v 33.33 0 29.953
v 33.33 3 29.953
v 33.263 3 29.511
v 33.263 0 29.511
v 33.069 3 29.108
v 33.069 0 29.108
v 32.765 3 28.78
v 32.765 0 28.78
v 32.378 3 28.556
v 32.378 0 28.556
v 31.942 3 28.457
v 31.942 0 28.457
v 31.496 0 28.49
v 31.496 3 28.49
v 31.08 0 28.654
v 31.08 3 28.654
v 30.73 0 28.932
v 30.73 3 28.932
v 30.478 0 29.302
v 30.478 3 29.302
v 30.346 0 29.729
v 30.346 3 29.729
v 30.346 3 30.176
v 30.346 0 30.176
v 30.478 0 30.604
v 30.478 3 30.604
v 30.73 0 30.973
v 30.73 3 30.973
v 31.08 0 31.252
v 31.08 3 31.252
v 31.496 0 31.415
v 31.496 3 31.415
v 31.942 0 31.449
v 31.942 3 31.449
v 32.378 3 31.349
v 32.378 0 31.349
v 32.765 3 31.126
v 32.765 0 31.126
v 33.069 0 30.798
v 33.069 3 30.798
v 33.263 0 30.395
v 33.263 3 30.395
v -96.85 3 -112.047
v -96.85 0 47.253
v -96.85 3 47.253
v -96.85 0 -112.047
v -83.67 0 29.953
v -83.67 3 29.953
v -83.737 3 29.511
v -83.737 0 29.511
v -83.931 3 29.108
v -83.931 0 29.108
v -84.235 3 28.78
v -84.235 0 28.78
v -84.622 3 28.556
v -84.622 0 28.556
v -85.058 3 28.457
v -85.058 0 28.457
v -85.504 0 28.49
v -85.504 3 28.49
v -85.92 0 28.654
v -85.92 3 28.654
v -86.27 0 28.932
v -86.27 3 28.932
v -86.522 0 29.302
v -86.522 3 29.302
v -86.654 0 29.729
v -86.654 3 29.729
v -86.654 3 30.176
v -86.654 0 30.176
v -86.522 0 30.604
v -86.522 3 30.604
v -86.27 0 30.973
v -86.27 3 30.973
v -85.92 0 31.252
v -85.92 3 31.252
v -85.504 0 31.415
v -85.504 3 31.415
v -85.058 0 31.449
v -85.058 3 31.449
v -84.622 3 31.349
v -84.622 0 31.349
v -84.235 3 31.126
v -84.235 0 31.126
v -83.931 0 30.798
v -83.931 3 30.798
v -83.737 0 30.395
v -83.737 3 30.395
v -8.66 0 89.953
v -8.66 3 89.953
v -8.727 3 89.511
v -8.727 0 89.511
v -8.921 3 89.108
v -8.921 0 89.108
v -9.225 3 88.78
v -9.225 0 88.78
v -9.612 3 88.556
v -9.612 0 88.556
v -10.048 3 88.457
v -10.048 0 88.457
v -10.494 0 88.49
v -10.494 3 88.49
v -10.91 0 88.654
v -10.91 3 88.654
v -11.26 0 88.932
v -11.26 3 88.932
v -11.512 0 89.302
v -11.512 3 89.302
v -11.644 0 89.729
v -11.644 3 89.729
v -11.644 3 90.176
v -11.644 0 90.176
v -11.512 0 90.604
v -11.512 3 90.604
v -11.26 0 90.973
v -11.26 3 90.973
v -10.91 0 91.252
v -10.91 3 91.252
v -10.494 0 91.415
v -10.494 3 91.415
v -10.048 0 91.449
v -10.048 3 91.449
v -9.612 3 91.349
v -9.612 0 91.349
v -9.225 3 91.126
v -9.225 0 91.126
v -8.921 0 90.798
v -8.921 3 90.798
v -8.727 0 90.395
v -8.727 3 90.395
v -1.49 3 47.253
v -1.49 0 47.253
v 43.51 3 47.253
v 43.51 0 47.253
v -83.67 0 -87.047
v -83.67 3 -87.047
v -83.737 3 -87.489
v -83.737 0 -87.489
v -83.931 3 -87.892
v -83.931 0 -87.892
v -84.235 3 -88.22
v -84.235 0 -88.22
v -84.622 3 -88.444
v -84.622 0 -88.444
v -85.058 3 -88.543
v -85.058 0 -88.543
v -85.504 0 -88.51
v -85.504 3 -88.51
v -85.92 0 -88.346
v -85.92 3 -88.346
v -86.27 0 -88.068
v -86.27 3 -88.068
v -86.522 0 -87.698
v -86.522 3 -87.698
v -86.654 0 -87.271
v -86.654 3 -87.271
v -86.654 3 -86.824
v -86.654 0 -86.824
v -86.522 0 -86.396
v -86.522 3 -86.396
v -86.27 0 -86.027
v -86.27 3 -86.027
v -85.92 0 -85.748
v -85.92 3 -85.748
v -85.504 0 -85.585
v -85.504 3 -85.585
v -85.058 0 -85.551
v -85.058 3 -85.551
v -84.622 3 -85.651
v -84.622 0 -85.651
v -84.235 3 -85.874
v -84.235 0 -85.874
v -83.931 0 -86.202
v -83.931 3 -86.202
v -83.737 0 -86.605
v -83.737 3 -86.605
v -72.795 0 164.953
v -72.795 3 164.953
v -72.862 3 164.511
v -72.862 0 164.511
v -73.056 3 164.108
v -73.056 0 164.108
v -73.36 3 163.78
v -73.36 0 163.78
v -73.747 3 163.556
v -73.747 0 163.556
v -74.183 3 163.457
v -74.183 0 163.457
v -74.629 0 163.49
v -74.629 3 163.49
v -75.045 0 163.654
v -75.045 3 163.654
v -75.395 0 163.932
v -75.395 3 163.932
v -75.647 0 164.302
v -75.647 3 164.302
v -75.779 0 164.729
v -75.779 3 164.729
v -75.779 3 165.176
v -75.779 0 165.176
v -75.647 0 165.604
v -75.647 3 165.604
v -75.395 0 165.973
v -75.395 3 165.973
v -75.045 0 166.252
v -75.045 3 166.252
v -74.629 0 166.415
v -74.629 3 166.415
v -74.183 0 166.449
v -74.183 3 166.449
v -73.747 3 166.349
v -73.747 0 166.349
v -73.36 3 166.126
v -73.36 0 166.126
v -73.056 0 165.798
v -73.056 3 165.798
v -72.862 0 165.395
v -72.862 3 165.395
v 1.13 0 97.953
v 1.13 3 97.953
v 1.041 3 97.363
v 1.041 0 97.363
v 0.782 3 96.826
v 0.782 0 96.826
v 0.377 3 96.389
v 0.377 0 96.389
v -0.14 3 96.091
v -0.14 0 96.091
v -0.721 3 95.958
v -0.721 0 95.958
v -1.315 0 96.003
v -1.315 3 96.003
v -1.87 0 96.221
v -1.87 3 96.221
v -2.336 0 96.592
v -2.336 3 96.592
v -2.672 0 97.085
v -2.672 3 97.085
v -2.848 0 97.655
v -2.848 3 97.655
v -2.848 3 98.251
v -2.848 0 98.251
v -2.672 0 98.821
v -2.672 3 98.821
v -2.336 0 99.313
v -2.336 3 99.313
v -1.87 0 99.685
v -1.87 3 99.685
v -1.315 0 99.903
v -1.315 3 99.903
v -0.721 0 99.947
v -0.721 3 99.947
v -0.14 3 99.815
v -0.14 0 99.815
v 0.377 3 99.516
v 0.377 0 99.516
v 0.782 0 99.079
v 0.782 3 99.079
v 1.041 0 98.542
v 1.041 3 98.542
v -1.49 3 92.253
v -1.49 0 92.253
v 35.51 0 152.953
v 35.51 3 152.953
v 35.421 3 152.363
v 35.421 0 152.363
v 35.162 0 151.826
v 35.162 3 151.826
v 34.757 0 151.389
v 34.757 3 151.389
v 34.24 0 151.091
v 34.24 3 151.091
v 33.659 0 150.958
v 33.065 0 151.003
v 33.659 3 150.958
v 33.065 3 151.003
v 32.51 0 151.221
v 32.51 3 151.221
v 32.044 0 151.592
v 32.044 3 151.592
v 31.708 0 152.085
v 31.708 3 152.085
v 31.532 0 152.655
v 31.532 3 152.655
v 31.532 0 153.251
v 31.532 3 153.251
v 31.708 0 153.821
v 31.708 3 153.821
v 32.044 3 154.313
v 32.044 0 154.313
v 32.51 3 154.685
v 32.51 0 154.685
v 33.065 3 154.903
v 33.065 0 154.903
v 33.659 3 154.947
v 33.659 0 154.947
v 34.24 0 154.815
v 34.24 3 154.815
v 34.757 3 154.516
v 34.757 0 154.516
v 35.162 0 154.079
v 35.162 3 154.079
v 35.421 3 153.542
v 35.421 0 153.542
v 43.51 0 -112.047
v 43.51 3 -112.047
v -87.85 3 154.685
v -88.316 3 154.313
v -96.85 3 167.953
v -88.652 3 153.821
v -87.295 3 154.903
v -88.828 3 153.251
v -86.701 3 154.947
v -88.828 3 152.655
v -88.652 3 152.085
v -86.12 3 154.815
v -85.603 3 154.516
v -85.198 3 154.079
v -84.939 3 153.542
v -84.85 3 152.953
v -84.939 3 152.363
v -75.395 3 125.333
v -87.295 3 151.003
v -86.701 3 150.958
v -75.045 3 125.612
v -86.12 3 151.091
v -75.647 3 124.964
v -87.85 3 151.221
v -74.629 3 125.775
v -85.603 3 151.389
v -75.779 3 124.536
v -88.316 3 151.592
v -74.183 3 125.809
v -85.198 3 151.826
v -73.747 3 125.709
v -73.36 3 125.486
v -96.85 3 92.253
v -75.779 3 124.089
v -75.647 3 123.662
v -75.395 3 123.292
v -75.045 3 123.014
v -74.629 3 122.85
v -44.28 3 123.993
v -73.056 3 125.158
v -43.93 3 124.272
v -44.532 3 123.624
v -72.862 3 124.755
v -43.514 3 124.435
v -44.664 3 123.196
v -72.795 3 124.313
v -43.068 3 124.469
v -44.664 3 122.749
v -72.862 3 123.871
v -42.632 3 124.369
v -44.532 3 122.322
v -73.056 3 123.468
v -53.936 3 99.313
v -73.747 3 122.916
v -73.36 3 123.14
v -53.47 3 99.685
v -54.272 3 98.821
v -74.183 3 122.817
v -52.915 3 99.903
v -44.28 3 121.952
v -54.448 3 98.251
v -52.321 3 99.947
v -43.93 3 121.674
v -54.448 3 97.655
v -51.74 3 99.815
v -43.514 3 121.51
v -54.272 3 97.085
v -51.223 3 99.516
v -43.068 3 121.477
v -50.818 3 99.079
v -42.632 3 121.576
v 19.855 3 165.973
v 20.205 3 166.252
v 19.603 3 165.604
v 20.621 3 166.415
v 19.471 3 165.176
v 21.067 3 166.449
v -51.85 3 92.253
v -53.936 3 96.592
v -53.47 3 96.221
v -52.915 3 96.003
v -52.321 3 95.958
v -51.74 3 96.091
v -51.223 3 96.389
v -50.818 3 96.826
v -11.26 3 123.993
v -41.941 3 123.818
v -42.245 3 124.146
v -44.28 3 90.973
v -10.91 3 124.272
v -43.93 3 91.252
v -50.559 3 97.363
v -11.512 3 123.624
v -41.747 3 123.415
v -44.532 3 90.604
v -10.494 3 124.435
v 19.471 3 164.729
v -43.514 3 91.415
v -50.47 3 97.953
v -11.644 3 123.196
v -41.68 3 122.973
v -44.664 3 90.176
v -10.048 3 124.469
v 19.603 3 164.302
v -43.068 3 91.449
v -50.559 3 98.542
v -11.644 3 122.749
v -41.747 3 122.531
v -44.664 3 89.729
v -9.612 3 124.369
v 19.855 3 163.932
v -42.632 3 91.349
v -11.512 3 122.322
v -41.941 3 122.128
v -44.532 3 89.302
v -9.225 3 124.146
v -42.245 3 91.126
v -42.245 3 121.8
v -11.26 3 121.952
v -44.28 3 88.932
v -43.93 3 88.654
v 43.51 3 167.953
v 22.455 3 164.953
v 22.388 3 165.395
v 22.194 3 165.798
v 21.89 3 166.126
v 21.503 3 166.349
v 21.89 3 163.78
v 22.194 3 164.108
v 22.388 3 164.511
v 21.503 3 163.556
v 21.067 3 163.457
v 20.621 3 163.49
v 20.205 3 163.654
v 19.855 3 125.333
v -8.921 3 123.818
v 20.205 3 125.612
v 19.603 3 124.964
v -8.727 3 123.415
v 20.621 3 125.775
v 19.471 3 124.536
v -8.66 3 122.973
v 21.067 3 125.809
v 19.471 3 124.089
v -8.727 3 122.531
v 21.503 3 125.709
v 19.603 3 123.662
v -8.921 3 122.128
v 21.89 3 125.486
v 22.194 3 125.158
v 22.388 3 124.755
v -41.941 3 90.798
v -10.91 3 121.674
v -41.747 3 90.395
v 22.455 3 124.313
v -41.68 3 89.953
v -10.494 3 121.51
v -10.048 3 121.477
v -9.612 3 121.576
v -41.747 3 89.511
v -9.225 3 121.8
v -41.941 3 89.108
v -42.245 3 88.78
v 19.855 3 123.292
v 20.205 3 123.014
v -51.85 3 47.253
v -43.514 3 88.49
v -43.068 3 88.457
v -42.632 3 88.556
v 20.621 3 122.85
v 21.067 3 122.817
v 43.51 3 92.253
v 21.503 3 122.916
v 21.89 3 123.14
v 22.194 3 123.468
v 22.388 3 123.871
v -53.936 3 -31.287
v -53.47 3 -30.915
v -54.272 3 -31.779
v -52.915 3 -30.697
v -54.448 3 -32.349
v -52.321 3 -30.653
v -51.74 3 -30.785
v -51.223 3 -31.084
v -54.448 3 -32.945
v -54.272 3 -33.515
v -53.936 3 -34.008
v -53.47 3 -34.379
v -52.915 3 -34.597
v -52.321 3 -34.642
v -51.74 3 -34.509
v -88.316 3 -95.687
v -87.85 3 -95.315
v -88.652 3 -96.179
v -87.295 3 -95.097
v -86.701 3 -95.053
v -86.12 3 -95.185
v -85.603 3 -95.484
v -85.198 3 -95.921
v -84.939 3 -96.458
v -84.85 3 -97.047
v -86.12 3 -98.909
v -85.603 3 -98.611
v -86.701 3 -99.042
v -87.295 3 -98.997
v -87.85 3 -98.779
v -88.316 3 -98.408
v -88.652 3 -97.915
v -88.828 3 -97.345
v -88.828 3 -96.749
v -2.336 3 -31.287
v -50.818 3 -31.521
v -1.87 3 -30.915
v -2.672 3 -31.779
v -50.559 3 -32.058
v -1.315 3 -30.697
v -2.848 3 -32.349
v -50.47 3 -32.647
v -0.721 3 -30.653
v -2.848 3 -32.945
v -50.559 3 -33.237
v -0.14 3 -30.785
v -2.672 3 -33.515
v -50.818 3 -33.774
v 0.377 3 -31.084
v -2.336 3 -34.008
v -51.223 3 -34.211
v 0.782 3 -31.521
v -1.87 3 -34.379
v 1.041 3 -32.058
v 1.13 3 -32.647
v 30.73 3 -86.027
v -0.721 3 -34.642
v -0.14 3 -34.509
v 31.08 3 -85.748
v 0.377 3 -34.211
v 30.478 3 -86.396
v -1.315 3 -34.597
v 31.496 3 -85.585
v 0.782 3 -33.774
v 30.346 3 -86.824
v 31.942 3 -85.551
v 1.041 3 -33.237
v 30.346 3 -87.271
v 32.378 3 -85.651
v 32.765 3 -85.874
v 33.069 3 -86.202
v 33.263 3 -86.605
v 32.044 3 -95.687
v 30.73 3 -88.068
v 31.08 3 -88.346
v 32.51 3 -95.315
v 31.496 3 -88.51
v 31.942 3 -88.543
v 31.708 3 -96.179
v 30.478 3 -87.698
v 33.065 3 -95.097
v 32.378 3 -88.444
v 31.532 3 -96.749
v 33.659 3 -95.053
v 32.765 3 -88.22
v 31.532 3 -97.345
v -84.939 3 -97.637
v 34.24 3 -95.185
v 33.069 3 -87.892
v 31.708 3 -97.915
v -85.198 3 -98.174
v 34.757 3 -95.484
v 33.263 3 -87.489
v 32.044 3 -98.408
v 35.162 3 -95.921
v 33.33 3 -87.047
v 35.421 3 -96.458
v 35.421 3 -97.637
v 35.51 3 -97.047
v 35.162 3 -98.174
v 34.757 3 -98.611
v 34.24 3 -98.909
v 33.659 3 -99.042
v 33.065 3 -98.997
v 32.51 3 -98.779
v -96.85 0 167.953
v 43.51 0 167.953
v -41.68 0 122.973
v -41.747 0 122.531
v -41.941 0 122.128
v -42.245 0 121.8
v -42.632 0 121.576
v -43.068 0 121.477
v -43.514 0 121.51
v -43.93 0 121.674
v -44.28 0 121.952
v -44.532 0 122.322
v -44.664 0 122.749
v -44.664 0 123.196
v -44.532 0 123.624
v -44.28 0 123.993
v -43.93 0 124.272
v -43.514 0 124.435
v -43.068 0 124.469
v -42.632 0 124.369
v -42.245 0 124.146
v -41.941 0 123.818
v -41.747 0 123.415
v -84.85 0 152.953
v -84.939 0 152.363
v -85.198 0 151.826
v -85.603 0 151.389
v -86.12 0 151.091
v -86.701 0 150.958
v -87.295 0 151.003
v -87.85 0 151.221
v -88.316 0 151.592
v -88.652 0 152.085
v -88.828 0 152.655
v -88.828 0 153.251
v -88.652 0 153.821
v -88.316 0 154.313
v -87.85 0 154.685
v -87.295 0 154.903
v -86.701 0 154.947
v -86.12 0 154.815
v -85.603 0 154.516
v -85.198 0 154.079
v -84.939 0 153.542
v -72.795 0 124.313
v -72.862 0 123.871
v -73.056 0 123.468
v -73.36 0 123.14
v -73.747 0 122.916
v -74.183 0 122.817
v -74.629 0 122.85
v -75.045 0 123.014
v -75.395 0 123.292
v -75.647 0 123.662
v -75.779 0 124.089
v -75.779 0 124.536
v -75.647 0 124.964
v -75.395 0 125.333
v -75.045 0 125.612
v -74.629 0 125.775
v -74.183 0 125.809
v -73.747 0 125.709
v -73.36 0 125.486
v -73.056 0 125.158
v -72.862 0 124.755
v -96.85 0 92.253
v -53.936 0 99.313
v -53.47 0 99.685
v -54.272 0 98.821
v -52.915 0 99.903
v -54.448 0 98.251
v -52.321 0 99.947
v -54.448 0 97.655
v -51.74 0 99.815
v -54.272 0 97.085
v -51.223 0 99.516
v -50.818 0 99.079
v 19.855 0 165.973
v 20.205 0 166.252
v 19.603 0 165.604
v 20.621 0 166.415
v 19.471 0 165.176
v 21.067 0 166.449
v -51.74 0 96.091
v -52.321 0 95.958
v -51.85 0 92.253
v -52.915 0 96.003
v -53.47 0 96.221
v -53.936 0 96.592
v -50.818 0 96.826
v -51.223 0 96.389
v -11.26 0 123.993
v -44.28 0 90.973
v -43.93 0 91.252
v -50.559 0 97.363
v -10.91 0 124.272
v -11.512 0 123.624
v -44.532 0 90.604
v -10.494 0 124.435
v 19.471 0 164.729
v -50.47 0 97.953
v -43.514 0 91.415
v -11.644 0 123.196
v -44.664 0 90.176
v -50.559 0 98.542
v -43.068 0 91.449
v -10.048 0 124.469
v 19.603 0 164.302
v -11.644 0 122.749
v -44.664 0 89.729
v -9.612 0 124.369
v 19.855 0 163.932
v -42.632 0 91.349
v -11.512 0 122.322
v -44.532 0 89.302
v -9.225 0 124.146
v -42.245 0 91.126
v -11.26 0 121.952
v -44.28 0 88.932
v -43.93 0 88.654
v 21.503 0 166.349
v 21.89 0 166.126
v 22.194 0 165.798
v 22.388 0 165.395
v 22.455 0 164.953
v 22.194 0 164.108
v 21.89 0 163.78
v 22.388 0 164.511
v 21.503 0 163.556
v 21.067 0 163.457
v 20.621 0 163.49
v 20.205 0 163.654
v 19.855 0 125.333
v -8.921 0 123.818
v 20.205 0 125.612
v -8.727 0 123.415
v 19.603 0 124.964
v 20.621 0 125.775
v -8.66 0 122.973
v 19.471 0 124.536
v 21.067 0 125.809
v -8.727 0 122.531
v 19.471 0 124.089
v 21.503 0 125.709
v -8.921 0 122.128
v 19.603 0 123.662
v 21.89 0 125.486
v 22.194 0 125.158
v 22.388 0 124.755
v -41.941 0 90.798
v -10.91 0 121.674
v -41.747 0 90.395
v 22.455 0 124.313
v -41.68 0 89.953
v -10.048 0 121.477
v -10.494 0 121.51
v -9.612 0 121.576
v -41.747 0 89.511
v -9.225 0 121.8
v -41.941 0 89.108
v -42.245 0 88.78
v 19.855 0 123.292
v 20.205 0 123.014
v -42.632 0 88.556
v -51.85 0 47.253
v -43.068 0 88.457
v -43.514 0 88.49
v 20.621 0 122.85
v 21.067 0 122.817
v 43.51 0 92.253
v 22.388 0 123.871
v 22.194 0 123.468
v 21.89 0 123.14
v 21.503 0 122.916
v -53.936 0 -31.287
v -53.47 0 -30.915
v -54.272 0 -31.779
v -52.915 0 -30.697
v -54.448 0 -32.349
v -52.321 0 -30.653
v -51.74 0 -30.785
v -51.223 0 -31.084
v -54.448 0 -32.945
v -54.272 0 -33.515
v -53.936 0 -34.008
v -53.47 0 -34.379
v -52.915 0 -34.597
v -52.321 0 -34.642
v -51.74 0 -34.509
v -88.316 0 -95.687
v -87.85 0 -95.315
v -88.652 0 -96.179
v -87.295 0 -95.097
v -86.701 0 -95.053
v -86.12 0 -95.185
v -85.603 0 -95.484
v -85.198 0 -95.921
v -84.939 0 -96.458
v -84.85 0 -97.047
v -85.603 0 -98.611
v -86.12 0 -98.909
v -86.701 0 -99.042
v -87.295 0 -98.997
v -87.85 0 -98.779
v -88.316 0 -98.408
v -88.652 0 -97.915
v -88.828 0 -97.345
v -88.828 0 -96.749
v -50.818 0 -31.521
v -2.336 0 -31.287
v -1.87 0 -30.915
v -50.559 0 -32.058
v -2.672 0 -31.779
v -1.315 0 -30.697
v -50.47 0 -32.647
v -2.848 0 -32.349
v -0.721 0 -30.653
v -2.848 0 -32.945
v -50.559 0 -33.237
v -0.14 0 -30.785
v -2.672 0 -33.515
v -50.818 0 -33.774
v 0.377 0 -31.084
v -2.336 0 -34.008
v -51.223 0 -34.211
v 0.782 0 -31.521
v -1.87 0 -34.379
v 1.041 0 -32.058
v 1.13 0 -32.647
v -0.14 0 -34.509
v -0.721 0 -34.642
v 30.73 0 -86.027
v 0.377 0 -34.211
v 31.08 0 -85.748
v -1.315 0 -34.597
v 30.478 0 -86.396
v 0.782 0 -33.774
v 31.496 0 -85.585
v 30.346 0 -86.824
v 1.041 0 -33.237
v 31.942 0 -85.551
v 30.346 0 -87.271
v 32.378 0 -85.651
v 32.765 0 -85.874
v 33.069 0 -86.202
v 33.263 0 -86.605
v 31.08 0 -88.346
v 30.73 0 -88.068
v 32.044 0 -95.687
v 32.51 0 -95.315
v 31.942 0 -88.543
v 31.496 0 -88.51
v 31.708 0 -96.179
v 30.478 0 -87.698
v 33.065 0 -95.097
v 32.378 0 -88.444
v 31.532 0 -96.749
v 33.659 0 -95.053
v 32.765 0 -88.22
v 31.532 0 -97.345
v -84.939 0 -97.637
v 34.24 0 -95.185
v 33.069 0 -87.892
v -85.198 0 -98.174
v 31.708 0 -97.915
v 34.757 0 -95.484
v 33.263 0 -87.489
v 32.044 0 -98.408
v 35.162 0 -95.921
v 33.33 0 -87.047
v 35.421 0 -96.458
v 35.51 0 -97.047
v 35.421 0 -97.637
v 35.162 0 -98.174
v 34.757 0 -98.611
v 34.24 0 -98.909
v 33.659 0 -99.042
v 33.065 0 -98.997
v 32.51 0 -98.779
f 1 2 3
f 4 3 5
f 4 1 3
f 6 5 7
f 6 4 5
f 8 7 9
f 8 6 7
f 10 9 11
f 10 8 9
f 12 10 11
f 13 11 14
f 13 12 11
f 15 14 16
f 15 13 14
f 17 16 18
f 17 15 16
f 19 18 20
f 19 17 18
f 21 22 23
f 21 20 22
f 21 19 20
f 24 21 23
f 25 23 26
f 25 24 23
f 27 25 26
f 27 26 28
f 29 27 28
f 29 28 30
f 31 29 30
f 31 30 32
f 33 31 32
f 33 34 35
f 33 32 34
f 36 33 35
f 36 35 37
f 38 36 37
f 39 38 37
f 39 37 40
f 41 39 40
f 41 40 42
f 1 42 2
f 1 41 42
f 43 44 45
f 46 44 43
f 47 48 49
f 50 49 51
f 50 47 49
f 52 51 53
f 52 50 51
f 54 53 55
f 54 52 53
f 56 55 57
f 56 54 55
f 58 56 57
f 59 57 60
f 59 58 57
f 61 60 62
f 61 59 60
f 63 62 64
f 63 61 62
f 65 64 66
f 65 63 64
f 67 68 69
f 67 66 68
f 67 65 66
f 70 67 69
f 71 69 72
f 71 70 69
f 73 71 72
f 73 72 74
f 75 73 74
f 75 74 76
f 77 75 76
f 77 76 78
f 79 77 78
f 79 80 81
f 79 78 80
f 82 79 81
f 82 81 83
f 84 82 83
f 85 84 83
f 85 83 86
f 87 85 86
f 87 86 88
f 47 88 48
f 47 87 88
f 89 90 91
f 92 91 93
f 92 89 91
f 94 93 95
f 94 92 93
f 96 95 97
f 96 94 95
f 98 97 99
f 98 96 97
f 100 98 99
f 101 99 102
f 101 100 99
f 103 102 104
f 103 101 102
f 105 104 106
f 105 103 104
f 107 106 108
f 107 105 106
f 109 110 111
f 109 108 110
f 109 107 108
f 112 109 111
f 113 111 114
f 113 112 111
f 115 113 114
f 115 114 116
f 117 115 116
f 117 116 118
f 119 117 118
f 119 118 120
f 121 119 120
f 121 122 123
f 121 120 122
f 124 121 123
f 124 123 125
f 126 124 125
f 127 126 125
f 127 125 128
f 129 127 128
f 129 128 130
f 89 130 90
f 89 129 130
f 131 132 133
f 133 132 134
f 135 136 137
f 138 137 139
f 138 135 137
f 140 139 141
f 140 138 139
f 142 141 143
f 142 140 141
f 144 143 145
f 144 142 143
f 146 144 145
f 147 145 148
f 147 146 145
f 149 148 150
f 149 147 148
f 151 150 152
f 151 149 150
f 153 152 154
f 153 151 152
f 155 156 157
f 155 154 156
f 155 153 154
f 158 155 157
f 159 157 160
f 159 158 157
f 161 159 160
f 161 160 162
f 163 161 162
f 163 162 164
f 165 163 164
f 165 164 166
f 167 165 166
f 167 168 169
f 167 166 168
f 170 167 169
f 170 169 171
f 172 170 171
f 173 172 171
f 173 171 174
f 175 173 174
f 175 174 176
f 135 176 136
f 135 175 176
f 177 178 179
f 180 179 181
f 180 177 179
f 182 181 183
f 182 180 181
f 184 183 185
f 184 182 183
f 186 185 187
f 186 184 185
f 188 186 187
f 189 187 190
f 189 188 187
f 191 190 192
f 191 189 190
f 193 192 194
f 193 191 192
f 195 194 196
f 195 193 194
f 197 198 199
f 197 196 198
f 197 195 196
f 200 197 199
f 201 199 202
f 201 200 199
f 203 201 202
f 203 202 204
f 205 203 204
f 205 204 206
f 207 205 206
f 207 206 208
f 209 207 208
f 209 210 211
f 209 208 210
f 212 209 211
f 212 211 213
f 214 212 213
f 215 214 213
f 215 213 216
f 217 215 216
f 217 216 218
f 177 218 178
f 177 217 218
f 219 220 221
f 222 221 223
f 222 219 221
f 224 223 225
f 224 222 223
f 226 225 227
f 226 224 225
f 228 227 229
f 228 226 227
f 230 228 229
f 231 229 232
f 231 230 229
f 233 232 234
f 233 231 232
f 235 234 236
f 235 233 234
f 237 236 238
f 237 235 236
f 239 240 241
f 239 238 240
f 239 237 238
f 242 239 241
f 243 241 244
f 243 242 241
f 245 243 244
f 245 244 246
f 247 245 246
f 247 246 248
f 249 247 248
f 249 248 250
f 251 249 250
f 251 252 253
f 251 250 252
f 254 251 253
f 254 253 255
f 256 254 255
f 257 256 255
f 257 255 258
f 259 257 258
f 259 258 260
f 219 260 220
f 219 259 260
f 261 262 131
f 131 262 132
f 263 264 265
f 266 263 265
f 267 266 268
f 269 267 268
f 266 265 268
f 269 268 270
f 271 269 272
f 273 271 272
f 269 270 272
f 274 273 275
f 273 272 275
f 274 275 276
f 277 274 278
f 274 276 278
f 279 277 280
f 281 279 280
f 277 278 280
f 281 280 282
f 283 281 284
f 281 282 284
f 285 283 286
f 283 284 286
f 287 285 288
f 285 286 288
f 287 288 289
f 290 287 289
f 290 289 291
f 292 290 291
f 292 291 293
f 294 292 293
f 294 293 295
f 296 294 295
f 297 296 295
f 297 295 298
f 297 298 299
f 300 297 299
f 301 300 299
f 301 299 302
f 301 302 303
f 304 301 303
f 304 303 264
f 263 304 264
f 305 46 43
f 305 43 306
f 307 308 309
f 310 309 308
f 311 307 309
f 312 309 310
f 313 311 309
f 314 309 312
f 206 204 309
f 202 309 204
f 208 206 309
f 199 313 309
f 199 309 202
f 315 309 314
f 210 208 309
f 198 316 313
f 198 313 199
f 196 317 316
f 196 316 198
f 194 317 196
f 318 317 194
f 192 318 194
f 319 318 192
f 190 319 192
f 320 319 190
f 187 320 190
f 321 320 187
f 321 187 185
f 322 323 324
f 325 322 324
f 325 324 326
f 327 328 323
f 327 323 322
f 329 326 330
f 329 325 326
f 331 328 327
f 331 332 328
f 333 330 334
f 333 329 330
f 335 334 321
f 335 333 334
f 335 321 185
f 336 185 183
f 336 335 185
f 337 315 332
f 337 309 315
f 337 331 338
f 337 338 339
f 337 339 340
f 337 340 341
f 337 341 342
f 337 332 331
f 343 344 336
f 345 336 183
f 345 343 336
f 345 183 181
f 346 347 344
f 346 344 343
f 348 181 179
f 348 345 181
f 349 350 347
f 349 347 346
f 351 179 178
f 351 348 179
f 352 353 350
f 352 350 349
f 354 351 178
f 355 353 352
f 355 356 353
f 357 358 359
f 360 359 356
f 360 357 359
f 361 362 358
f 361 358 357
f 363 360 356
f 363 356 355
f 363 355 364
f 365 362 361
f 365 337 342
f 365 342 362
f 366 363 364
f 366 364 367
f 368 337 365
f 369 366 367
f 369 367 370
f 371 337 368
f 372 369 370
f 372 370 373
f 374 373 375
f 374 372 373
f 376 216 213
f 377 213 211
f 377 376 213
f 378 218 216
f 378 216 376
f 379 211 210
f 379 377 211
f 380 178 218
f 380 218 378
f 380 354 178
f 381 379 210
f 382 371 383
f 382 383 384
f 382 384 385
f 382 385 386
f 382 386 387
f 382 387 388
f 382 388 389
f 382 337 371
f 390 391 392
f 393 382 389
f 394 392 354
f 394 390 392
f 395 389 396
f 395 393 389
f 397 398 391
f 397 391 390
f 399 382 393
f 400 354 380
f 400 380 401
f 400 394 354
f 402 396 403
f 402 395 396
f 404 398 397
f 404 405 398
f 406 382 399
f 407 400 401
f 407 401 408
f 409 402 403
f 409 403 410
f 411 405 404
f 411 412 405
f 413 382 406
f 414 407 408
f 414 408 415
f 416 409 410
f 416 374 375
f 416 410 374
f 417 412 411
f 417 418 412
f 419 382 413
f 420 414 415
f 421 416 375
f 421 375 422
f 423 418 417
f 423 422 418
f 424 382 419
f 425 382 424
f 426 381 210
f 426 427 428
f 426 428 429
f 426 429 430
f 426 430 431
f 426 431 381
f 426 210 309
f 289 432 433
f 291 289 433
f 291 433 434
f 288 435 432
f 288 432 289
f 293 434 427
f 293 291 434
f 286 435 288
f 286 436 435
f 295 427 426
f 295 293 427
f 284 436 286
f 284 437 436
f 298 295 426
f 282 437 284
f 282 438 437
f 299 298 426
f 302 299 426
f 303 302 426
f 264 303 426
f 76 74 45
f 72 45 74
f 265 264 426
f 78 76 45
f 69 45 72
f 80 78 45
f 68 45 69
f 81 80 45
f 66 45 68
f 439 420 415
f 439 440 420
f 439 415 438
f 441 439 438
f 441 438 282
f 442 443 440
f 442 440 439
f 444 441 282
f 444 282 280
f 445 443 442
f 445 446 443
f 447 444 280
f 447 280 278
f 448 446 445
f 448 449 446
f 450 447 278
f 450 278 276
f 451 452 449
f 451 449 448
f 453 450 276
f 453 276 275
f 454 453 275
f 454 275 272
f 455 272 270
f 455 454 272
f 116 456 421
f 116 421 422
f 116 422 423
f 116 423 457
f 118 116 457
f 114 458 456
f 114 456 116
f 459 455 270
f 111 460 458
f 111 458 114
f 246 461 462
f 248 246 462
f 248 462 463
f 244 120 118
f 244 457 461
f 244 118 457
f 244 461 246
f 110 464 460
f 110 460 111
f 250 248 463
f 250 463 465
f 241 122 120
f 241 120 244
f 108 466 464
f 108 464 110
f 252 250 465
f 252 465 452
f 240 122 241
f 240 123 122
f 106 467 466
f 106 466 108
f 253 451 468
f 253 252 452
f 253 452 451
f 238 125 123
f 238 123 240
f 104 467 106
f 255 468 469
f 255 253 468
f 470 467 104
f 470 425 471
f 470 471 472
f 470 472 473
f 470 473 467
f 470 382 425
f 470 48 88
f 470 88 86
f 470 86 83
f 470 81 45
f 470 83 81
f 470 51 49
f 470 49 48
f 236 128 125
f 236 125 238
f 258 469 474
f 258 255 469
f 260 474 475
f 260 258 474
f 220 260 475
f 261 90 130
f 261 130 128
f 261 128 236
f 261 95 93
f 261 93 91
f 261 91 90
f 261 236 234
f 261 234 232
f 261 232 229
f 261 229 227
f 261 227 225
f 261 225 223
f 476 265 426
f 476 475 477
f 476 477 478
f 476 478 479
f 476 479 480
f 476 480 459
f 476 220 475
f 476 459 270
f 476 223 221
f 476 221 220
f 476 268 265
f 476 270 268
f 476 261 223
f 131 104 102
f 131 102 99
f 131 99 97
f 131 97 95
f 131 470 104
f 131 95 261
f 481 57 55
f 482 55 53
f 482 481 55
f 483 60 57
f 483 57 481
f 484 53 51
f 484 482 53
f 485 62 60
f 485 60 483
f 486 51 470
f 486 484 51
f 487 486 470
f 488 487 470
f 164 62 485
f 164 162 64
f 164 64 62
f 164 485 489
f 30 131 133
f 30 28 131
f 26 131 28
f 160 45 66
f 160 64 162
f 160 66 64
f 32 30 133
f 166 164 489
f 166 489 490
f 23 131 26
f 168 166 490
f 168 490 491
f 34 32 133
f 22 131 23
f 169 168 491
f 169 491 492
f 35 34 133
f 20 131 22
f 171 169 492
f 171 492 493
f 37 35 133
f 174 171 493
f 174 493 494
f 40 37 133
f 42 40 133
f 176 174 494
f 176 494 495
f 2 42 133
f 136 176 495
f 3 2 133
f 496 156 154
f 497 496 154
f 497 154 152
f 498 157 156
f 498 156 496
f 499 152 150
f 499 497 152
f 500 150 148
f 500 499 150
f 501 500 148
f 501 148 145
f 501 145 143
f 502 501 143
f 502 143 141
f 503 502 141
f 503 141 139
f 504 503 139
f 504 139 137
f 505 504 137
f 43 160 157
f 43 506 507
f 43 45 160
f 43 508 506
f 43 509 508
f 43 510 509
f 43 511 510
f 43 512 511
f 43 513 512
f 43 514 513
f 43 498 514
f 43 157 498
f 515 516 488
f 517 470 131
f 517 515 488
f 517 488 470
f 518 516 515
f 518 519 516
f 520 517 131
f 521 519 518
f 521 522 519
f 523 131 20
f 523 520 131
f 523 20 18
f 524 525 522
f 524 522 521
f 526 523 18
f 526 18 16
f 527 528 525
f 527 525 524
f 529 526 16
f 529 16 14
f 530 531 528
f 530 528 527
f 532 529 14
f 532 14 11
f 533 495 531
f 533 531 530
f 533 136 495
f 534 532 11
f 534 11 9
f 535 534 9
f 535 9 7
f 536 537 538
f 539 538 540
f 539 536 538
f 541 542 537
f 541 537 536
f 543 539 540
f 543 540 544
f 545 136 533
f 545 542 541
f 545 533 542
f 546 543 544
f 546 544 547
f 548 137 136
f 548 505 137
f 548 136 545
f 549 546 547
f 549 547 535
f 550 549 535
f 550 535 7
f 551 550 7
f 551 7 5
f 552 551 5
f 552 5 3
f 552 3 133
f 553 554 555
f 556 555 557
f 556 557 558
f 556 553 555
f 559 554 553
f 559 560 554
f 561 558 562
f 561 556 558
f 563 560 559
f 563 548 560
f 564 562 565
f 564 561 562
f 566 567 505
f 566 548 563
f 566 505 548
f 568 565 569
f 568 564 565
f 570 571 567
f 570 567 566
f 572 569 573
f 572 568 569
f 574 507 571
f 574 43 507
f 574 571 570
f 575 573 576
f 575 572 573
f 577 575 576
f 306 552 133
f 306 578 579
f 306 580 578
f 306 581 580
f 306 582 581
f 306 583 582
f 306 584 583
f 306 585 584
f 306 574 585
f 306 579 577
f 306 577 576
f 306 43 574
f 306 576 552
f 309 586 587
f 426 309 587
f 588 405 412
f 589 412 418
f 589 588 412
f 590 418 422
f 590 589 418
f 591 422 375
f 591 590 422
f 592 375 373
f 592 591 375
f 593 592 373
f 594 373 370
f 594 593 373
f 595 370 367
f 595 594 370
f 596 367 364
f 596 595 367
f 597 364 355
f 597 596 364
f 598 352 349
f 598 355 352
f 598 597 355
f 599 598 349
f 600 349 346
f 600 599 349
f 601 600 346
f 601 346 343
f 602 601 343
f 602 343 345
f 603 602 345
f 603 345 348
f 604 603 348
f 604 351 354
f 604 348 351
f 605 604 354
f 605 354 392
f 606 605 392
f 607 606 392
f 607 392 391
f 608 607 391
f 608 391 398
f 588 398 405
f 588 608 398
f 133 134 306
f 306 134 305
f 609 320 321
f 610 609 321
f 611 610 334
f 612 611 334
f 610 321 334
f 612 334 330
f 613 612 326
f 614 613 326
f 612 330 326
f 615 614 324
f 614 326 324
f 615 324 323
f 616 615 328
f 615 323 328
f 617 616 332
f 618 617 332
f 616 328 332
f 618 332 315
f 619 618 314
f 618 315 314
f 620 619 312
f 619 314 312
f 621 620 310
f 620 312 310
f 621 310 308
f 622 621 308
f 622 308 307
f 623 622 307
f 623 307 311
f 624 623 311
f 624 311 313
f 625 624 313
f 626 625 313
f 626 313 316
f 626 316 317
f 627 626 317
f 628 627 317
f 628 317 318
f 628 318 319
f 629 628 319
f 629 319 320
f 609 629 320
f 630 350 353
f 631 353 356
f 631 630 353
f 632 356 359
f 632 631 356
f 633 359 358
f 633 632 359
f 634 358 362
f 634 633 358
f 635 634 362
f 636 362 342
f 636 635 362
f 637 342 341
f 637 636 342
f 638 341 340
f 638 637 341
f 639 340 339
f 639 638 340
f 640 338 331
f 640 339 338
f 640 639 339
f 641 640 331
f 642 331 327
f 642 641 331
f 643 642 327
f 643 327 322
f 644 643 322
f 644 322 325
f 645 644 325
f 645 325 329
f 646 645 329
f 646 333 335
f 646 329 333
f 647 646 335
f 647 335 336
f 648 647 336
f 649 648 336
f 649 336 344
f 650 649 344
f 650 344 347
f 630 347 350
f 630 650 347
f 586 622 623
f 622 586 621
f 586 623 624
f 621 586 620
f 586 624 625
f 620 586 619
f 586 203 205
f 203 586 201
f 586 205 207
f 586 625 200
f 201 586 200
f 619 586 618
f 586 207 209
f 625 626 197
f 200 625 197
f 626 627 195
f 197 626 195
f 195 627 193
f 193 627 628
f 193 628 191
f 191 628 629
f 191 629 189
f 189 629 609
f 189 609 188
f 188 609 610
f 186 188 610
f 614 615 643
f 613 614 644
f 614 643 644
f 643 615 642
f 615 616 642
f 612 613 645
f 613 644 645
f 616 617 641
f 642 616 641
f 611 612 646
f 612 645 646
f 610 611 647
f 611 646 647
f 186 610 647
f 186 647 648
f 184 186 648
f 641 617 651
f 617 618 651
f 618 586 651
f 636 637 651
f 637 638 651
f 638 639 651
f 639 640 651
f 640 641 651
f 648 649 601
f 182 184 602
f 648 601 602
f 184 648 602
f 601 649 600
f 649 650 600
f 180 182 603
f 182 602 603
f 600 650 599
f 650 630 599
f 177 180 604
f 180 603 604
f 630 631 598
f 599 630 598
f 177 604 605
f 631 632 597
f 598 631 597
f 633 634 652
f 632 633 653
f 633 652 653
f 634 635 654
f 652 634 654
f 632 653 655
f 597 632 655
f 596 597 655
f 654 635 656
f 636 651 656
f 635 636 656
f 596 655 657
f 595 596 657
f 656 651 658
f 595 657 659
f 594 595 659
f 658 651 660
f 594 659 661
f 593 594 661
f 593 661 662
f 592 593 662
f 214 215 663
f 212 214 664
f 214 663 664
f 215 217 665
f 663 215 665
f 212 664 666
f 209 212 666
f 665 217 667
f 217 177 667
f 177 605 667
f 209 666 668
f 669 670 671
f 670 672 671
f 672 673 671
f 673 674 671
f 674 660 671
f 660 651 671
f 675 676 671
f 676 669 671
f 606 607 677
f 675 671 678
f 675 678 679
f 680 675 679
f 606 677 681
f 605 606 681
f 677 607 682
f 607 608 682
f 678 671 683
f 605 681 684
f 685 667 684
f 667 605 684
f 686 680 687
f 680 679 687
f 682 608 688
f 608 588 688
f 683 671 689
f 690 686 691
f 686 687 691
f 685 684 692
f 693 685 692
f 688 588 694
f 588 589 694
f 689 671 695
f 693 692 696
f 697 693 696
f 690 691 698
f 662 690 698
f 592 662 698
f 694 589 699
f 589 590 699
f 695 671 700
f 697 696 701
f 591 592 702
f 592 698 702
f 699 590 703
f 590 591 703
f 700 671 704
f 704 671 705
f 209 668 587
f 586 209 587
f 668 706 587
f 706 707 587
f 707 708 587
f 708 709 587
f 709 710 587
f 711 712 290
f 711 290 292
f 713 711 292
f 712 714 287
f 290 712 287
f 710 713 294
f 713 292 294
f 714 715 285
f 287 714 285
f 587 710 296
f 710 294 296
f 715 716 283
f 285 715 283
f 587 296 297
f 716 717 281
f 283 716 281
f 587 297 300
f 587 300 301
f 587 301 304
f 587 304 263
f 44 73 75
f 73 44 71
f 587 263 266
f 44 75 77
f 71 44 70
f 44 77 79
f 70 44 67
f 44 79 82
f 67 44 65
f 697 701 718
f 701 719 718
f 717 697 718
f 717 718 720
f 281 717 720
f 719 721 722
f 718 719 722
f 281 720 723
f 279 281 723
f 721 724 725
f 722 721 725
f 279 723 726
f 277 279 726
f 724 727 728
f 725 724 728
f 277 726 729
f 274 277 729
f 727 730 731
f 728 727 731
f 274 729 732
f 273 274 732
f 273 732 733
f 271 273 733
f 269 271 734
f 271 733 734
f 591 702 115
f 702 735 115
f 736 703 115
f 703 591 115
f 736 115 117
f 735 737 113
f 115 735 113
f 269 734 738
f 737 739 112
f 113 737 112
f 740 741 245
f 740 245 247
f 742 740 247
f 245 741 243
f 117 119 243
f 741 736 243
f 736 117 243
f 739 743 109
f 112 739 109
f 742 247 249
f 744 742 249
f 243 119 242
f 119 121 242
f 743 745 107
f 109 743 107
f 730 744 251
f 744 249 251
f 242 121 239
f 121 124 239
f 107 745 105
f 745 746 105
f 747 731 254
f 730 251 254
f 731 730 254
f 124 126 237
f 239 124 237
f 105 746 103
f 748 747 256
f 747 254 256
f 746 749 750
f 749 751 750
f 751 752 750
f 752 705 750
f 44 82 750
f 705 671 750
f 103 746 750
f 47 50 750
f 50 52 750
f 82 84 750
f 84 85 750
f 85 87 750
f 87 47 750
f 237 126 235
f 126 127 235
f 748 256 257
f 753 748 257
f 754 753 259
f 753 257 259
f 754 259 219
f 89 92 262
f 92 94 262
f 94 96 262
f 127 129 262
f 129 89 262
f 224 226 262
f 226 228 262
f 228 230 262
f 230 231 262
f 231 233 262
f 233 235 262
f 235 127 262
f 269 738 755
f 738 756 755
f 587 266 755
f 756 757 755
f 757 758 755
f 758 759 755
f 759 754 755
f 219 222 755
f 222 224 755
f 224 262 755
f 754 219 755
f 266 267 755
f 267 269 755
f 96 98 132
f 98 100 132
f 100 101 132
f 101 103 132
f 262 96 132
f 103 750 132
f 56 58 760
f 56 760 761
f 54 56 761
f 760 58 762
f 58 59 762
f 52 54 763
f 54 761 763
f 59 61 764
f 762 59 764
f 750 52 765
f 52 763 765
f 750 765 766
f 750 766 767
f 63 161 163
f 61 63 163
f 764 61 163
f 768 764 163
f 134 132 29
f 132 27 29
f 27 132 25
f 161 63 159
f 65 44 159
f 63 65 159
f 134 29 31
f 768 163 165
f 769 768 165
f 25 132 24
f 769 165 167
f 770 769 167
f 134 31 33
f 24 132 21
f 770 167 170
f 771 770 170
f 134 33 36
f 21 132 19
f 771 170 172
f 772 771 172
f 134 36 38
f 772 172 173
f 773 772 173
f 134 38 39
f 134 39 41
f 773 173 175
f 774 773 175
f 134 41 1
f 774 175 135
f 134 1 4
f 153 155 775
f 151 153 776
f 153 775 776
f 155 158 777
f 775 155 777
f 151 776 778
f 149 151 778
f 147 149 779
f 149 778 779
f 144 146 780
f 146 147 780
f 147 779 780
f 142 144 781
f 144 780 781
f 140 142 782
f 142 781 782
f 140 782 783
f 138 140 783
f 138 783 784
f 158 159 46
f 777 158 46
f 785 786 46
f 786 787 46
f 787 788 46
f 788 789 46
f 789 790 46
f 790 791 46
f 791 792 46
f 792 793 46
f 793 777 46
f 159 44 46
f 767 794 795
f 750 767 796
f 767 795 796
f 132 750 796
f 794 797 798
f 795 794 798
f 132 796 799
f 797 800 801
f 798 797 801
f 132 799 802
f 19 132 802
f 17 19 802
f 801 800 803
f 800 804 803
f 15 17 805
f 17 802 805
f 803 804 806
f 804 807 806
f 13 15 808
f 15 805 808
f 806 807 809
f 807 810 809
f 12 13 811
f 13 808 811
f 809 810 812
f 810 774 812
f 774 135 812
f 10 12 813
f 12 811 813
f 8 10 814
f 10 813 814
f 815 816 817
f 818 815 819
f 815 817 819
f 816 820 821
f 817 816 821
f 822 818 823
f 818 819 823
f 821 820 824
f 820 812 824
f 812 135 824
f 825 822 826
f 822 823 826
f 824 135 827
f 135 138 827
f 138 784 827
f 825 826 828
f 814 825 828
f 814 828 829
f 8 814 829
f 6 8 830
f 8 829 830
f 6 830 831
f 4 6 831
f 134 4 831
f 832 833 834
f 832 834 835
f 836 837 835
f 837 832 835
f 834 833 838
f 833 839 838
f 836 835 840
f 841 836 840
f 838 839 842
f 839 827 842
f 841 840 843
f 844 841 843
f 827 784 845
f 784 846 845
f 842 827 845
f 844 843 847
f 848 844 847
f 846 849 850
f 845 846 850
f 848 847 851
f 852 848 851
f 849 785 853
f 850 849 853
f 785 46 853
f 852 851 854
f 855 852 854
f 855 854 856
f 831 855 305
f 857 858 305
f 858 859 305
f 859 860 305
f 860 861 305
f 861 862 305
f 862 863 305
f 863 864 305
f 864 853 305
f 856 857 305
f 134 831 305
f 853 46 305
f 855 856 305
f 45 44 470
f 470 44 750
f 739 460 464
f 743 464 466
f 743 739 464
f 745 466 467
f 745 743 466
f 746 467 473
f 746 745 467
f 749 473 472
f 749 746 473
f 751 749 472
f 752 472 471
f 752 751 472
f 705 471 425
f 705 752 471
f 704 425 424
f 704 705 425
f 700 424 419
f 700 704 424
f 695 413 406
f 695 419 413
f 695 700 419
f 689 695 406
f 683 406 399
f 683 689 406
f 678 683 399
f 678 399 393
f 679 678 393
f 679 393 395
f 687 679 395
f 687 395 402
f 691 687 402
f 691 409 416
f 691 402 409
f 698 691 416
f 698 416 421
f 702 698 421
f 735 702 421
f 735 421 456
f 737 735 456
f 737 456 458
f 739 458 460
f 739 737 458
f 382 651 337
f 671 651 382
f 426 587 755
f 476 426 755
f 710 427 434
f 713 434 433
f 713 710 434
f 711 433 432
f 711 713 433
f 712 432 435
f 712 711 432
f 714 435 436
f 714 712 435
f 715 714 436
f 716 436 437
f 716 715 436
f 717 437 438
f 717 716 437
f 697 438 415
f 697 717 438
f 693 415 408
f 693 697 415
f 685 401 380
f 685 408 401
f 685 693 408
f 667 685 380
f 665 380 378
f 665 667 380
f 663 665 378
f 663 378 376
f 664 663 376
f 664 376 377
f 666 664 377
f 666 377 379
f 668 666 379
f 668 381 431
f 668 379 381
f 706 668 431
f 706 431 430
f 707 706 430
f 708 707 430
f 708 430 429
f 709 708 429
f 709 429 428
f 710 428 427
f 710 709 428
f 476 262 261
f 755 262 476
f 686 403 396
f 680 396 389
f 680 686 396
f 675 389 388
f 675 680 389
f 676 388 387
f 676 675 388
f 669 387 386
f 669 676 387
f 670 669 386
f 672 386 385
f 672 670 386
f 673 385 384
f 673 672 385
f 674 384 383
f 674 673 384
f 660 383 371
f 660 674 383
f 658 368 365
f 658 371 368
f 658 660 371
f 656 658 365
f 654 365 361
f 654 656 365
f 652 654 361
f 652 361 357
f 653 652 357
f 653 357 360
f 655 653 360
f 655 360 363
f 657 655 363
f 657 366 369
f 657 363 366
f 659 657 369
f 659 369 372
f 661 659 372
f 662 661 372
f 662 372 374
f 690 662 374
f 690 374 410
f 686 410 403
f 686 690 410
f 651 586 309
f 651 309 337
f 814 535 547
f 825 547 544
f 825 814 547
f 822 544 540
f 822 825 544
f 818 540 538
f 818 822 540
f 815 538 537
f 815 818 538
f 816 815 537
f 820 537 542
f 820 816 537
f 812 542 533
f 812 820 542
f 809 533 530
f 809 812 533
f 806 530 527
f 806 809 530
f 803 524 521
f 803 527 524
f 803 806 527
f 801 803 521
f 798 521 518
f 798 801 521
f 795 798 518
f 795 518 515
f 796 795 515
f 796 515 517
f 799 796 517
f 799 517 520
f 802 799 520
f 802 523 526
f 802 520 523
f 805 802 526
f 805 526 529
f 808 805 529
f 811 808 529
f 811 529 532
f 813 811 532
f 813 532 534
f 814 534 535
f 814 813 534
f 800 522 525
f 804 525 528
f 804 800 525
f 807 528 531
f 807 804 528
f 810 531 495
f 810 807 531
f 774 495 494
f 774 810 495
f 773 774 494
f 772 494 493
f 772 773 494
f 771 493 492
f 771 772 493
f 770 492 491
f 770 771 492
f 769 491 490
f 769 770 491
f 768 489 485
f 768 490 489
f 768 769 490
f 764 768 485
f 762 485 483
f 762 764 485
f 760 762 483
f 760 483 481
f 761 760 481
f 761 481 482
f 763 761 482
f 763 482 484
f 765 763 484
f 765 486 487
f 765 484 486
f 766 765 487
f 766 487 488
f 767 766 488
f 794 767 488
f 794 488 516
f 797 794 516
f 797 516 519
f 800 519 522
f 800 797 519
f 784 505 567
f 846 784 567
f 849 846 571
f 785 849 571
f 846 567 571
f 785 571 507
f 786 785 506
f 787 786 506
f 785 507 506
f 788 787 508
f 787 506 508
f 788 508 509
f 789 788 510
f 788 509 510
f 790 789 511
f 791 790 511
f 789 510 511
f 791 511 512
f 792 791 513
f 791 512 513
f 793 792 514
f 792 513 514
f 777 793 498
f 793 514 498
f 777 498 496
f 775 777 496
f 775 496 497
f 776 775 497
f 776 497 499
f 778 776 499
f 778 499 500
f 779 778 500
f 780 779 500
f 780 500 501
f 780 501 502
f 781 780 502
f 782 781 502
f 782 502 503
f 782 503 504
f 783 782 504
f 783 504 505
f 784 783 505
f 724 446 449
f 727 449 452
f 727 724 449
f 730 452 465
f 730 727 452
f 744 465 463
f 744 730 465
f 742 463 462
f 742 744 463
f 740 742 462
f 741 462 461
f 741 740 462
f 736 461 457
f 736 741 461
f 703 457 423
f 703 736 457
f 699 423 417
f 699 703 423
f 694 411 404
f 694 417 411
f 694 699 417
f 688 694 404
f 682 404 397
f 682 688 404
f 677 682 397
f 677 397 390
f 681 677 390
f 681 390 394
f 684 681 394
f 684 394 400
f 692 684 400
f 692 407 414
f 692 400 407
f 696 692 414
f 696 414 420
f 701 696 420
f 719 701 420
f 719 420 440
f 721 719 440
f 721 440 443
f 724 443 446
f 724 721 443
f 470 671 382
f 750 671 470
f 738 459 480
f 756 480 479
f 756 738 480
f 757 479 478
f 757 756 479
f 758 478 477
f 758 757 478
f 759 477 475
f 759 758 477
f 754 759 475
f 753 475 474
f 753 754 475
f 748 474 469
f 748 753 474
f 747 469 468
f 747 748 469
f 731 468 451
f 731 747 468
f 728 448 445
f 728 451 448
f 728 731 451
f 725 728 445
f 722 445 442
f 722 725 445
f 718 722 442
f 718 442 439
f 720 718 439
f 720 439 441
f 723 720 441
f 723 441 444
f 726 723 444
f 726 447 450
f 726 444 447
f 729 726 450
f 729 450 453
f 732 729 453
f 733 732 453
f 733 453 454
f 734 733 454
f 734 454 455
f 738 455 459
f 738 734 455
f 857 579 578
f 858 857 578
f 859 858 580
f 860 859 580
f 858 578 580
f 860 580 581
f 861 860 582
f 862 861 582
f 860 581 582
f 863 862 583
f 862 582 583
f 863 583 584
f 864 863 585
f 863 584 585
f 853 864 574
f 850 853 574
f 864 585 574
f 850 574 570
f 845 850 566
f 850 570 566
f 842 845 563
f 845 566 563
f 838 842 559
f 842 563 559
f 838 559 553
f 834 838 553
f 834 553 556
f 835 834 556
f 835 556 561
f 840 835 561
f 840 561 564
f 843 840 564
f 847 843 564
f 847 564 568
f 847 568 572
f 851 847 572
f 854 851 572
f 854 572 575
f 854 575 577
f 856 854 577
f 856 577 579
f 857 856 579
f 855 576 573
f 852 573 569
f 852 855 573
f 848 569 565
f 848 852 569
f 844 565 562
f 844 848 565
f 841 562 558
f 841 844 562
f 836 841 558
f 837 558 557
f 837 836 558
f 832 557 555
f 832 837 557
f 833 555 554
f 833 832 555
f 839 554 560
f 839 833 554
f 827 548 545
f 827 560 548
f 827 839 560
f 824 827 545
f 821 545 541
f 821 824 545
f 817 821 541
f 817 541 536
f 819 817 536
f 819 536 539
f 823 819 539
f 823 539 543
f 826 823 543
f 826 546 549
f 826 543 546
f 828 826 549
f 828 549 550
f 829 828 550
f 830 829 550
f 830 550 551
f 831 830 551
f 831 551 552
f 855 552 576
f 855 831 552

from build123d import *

# Parameters (mm, degrees)
SCHIZZO1_W                   = 140.36
SCHIZZO1_H                   = 280
ESTRUSIONE_ESTRUSIONE1_DEPTH = 3
SCHIZZO2_R                   = 2
TAGLIO_ESTRUSIONE1_DEPTH     = 4
SCHIZZO3_W                   = 45
SCHIZZO3_H                   = 45
TAGLIO_ESTRUSIONE2_DEPTH     = 4
SCHIZZO4_R                   = 1.5
SCHIZZO4_R_2                 = 2
TAGLIO_ESTRUSIONE3_DEPTH     = 4


with BuildPart() as part:
    # Schizzo1 → Estrusione-Estrusione1 (new body)
    with BuildSketch(Plane(origin=(0, 0, 0), x_dir=(1, 0, 0), z_dir=(0, 1, 0))):
        with Locations((-26.670393701, -27.952755906)):
            Rectangle(SCHIZZO1_W, SCHIZZO1_H)
    extrude(amount=ESTRUSIONE_ESTRUSIONE1_DEPTH)

    # Schizzo2 → Taglio-Estrusione1 (cut, through all)
    with BuildSketch(Plane(origin=(0, 3, 0), x_dir=(1, 0, 0), z_dir=(0, 1, 0))):
        with Locations((-86.850393701, -152.952755906)):
            Circle(SCHIZZO2_R)
        with Locations((33.509606299, -152.952755906)):
            Circle(SCHIZZO2_R)
        with Locations((-86.850393701, 97.047244094)):
            Circle(SCHIZZO2_R)
        with Locations((33.509606299, 97.047244094)):
            Circle(SCHIZZO2_R)
    extrude(amount=-TAGLIO_ESTRUSIONE1_DEPTH, mode=Mode.SUBTRACT)

    # Schizzo3 → Taglio-Estrusione2 (cut, through all)
    with BuildSketch(Plane(origin=(0, 0, 0), x_dir=(1, 0, 0), z_dir=(0, 1, 0))):
        with Locations((-74.350393701, -69.752755906)):
            Rectangle(SCHIZZO3_W, SCHIZZO3_H)
        with Locations((21.009606299, -69.752755906)):
            Rectangle(SCHIZZO3_W, SCHIZZO3_H)
    extrude(amount=TAGLIO_ESTRUSIONE2_DEPTH, mode=Mode.SUBTRACT)

    # Schizzo4 → Taglio-Estrusione3 (cut, through all)
    with BuildSketch(Plane(origin=(0, 0, 0), x_dir=(1, 0, 0), z_dir=(0, 1, 0))):
        with Locations((-85.170393701, 87.047244094)):
            Circle(SCHIZZO4_R)
        with Locations((-85.170393701, -29.952755906)):
            Circle(SCHIZZO4_R)
        with Locations((31.829606299, -29.952755906)):
            Circle(SCHIZZO4_R)
        with Locations((31.829606299, 87.047244094)):
            Circle(SCHIZZO4_R)
        with Locations((-43.180393701, -89.952755906)):
            Circle(SCHIZZO4_R)
        with Locations((-10.160393701, -89.952755906)):
            Circle(SCHIZZO4_R)
        with Locations((-10.160393701, -122.972755906)):
            Circle(SCHIZZO4_R)
        with Locations((-43.180393701, -122.972755906)):
            Circle(SCHIZZO4_R)
        with Locations((-52.470393701, -97.952755906)):
            Circle(SCHIZZO4_R_2)
        with Locations((-0.870393701, -97.952755906)):
            Circle(SCHIZZO4_R_2)
        with Locations((-0.870393701, 32.647244094)):
            Circle(SCHIZZO4_R_2)
        with Locations((-52.470393701, 32.647244094)):
            Circle(SCHIZZO4_R_2)
        with Locations((-74.295393701, -124.312755906)):
            Circle(SCHIZZO4_R)
        with Locations((20.954606299, -124.312755906)):
            Circle(SCHIZZO4_R)
        with Locations((20.954606299, -164.952755906)):
            Circle(SCHIZZO4_R)
        with Locations((-74.295393701, -164.952755906)):
            Circle(SCHIZZO4_R)
    extrude(amount=TAGLIO_ESTRUSIONE3_DEPTH, mode=Mode.SUBTRACT)


solid = part.part
